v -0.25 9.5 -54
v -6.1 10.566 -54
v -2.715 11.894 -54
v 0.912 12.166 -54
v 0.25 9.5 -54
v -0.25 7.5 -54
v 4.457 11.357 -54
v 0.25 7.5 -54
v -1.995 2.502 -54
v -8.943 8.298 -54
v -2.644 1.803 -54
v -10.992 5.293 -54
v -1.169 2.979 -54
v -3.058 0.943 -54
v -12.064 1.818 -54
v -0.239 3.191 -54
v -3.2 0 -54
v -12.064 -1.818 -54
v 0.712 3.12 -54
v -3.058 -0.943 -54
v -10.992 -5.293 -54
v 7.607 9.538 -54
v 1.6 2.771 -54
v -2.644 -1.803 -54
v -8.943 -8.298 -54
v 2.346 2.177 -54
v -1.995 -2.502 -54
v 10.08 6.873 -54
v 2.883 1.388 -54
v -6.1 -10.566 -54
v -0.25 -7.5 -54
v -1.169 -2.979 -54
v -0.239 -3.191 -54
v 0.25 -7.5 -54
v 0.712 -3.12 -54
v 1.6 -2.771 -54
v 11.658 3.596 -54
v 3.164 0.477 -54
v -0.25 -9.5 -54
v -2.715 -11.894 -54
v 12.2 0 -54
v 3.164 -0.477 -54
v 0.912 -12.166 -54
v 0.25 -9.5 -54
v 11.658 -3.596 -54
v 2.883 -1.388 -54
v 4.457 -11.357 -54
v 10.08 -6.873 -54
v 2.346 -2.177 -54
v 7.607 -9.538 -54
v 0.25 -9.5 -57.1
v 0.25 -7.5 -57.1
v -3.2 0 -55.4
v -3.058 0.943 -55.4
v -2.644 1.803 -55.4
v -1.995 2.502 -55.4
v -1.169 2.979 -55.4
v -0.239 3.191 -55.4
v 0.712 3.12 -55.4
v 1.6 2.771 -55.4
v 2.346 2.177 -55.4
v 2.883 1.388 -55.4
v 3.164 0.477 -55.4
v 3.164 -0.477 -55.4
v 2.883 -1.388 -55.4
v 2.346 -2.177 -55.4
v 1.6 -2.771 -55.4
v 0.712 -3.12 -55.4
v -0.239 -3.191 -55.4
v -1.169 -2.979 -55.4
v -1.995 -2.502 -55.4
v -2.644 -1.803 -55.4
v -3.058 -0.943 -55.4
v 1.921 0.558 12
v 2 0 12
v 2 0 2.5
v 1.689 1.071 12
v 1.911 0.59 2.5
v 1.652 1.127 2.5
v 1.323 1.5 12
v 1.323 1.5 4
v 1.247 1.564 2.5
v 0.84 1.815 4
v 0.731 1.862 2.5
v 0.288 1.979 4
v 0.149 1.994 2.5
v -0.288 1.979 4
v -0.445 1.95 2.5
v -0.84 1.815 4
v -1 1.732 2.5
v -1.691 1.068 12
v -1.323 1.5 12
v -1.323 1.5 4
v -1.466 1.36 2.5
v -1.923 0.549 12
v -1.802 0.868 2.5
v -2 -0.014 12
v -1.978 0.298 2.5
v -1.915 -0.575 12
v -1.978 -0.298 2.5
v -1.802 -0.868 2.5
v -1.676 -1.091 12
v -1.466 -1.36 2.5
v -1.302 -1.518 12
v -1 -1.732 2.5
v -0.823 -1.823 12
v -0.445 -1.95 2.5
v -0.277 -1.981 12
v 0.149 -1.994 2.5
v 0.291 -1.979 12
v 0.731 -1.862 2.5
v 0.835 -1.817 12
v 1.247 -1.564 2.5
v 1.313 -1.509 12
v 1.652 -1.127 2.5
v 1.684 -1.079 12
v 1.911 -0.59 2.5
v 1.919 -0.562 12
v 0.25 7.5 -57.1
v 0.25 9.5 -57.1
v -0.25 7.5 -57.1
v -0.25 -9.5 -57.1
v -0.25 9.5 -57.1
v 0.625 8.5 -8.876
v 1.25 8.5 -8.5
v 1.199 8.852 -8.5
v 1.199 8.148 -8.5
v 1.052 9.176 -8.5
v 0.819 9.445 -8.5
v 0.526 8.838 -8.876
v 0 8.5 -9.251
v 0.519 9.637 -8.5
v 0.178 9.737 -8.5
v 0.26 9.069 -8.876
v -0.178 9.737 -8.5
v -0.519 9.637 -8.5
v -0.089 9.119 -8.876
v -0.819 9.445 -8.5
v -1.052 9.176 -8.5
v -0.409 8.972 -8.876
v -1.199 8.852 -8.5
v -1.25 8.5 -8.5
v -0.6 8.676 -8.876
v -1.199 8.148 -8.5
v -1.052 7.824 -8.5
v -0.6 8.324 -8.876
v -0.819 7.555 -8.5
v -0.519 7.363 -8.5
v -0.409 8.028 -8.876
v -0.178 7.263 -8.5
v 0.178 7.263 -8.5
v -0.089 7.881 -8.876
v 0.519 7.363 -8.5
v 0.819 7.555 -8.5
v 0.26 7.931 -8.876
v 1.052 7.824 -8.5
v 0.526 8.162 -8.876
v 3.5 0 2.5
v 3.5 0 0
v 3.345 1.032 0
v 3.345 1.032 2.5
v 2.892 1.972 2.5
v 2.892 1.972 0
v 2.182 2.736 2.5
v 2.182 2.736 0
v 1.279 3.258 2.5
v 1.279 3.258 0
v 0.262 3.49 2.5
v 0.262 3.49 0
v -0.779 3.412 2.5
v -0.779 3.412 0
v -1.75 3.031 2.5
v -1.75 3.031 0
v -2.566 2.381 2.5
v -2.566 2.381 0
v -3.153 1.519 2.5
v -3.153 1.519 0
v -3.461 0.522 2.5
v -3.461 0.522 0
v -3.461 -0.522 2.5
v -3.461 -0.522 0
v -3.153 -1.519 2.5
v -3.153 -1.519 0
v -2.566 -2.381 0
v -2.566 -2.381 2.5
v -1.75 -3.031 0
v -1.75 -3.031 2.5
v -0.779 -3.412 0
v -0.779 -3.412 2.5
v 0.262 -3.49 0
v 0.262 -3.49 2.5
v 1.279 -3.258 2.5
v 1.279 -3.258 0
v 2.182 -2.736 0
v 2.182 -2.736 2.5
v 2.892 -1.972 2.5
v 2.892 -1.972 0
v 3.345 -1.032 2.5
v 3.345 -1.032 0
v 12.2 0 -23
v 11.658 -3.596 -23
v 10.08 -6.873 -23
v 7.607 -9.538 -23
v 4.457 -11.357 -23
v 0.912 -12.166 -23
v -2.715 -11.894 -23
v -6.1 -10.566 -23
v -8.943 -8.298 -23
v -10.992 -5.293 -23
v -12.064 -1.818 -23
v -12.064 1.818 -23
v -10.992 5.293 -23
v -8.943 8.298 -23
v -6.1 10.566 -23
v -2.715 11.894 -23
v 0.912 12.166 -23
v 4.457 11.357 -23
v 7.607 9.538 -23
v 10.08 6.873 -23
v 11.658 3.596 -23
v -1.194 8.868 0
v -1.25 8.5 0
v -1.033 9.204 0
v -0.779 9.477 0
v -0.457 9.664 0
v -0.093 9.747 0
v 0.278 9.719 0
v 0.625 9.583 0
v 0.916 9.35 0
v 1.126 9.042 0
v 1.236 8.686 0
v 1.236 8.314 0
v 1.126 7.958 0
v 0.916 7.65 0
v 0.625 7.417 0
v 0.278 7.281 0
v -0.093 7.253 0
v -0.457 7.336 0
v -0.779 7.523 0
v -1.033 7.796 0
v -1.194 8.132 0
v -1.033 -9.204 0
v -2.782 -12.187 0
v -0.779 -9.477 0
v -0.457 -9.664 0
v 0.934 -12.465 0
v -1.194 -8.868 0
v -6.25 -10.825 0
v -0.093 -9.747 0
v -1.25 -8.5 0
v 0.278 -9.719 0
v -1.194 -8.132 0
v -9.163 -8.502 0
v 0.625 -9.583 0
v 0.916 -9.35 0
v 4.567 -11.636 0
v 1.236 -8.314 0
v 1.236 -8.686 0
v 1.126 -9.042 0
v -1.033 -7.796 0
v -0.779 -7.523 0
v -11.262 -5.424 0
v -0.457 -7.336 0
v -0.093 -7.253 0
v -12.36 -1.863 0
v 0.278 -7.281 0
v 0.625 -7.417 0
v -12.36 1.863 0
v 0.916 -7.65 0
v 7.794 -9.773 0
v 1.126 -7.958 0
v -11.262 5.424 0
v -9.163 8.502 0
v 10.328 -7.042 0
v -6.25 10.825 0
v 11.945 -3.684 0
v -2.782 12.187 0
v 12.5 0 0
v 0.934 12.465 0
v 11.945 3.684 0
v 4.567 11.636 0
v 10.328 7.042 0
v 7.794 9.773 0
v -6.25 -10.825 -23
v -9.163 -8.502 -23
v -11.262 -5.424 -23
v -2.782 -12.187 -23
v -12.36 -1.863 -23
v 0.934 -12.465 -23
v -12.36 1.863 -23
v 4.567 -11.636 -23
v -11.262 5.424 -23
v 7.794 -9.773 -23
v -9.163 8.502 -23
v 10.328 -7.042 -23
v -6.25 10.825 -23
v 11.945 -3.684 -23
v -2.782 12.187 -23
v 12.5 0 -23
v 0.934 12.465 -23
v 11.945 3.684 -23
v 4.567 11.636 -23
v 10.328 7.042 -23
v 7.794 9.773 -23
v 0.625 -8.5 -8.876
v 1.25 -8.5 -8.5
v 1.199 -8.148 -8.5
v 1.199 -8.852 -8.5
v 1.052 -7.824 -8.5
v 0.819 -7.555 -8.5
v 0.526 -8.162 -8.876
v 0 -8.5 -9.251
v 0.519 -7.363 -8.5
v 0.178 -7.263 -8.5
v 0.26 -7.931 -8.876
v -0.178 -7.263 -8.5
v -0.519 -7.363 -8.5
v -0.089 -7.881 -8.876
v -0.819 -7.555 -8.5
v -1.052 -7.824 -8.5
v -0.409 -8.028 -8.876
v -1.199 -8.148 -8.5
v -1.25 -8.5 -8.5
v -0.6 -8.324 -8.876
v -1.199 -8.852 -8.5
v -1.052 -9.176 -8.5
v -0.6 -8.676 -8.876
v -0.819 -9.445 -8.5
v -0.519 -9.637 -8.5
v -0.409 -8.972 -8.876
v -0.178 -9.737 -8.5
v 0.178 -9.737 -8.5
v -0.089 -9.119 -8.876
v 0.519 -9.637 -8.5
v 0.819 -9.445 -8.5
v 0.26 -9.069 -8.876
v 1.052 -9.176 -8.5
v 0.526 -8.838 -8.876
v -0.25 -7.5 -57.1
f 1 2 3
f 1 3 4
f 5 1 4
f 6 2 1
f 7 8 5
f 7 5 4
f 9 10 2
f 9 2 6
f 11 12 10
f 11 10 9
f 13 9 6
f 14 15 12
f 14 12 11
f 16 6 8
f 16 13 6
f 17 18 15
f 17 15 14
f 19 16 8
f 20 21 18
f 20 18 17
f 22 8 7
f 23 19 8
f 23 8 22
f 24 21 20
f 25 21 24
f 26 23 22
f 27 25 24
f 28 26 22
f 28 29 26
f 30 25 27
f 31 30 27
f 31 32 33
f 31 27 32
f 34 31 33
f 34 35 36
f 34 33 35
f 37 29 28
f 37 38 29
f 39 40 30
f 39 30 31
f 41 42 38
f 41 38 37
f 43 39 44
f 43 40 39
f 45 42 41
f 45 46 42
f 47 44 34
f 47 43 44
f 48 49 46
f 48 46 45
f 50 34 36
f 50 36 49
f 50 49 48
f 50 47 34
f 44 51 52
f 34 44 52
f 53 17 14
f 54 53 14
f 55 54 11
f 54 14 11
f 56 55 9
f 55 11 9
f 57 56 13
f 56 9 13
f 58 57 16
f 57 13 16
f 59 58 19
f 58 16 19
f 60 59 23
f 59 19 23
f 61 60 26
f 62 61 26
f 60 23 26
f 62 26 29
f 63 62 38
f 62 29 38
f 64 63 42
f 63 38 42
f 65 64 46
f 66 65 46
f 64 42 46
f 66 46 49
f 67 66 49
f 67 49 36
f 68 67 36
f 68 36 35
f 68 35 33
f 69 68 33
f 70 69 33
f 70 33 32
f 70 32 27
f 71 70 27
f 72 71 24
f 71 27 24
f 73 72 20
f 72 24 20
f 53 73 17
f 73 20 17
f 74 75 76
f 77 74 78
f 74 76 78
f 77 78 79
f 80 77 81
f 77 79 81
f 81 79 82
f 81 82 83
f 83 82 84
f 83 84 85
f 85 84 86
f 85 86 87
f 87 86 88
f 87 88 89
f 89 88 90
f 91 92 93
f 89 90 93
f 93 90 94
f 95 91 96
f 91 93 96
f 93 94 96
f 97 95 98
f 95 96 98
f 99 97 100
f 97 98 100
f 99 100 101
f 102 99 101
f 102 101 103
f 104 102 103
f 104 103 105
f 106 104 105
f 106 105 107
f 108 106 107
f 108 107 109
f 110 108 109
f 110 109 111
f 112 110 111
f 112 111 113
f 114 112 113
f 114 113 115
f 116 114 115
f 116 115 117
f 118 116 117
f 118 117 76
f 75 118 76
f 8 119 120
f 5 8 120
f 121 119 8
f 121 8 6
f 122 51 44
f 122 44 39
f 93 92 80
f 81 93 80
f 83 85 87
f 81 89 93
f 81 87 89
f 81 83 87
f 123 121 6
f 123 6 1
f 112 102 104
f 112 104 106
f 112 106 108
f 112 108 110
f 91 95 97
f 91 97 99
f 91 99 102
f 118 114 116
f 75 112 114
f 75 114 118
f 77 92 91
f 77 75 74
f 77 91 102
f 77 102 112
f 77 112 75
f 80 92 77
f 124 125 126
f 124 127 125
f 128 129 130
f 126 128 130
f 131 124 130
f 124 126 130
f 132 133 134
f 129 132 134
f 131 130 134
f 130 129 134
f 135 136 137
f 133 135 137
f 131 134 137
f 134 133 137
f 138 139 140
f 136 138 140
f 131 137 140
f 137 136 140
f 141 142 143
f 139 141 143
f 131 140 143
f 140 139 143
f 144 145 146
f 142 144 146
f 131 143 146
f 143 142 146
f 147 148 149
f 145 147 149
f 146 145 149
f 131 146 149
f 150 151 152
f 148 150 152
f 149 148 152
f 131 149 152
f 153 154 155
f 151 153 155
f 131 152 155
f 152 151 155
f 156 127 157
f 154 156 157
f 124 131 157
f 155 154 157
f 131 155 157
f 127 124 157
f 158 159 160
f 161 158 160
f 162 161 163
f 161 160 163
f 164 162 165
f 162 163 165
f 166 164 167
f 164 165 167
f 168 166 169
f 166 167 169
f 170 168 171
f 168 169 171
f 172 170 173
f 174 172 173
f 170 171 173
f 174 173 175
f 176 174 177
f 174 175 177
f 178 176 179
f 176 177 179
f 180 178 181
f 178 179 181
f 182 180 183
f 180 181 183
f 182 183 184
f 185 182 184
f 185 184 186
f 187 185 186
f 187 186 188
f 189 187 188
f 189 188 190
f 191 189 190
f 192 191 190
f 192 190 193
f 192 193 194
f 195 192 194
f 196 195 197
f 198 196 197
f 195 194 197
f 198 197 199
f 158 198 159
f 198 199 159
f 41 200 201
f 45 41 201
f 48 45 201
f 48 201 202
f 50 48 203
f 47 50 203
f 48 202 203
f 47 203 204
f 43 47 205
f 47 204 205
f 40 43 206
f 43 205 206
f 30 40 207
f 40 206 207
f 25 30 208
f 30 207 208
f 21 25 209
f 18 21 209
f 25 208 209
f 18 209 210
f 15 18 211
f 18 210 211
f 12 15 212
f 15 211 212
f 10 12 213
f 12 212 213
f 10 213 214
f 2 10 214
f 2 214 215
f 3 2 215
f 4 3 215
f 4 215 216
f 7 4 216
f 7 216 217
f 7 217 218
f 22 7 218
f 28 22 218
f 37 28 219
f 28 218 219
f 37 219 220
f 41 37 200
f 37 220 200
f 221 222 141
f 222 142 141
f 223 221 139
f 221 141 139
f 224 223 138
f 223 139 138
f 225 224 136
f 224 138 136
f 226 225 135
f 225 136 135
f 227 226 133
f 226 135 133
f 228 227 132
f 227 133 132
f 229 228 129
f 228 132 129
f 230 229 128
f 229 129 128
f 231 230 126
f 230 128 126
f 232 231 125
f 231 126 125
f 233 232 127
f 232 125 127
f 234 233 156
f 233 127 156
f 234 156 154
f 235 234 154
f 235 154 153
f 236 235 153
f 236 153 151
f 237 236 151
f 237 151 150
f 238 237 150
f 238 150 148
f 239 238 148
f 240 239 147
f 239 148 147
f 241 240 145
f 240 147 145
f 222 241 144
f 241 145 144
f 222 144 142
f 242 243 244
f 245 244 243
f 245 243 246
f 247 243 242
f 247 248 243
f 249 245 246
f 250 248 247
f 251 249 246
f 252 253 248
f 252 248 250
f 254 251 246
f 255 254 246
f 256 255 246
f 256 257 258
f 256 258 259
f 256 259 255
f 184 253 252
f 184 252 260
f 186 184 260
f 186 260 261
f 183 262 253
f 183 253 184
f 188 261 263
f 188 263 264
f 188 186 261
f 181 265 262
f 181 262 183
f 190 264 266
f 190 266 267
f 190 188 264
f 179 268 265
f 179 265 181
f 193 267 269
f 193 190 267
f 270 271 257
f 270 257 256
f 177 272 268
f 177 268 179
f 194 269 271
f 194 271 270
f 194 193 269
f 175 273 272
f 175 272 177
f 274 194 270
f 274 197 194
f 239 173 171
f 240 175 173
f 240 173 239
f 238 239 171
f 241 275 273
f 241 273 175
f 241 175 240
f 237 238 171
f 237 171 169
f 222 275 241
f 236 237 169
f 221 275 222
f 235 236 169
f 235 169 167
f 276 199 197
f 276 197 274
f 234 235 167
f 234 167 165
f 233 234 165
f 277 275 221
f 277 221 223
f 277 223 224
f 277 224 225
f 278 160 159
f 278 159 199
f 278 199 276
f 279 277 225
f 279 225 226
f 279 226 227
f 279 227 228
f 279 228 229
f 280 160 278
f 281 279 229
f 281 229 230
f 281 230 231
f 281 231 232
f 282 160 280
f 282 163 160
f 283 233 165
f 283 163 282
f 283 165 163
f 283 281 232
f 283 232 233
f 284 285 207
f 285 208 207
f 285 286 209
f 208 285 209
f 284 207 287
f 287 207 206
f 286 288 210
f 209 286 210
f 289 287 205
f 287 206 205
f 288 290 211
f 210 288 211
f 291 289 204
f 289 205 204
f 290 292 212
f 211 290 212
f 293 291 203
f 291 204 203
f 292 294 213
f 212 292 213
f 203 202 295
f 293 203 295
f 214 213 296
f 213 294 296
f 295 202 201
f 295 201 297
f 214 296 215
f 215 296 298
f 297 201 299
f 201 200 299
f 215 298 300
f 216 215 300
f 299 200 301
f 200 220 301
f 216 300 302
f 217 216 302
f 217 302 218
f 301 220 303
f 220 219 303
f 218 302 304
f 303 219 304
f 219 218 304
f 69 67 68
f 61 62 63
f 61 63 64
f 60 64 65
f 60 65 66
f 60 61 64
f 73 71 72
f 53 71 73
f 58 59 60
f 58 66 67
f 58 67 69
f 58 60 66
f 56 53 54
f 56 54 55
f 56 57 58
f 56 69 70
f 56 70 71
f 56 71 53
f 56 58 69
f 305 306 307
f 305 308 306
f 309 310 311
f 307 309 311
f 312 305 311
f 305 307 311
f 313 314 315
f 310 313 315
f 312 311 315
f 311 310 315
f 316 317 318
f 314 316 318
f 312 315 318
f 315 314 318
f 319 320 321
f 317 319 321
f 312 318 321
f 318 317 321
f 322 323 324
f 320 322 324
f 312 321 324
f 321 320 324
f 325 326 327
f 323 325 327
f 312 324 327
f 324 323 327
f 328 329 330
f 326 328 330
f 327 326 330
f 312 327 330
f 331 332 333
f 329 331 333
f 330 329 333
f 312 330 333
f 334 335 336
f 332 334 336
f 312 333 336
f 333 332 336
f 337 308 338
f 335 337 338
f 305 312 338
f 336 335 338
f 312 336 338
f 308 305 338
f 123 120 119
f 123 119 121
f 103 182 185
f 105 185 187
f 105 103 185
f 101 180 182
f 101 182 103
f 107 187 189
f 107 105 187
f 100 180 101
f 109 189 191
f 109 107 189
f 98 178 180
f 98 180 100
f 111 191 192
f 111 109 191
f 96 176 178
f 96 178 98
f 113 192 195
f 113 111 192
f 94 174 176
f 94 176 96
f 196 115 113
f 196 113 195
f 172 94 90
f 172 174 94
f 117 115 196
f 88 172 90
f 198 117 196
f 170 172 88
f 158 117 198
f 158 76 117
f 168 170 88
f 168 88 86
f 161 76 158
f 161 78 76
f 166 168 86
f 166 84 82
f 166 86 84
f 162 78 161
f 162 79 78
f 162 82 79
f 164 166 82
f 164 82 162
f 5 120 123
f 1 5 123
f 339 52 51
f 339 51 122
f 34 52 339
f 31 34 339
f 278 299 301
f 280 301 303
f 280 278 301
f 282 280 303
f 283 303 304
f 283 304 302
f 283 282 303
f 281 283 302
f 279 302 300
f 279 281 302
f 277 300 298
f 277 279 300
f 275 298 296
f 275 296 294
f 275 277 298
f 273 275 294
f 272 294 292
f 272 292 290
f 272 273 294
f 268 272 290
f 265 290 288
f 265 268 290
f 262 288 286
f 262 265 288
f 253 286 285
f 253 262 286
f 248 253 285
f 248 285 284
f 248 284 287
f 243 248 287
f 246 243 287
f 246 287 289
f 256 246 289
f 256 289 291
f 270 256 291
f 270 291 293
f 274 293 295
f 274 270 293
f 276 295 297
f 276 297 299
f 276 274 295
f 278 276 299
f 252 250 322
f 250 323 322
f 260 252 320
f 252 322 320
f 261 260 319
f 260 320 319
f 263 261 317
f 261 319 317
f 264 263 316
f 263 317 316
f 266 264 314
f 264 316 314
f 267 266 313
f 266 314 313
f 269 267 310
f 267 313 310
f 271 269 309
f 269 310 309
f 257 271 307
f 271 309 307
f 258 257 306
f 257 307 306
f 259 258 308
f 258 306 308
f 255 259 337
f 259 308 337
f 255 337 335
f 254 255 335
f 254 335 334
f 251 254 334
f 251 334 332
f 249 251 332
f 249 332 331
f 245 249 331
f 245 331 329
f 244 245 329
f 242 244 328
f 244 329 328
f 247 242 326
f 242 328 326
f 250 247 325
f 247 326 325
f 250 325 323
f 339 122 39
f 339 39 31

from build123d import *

# Parameters (mm, degrees)
SKETCH1_R             = 12.5
BOSS_EXTRUDE1_DEPTH   = 23
SKETCH2_R             = 3.5
BOSS_EXTRUDE2_DEPTH   = 2.5
SKETCH3_R             = 2
BOSS_EXTRUDE4_DEPTH   = 9.5
SKETCH4_W             = 2.645751312
SKETCH4_H             = 0.5
CUT_EXTRUDE1_DEPTH    = 8
SKETCH5_R             = 12.2
BOSS_EXTRUDE5_DEPTH   = 31
SKETCH6_R             = 3.2
BOSS_EXTRUDE6_DEPTH   = 1.4
SKETCH7_W             = 0.5
SKETCH7_H             = 2
BOSS_EXTRUDE7_DEPTH   = 3.1
M3_TAPPED_HOLE1_D     = 2.5
M3_TAPPED_HOLE1_DEPTH = 8.5
M3_TAPPED_HOLE1_TIP   = 0.751075774


with BuildPart() as part:
    # Sketch1 → Boss-Extrude1 (new body)
    with BuildSketch(Plane.XY):
        Circle(SKETCH1_R)
    extrude(amount=-BOSS_EXTRUDE1_DEPTH)

    # Sketch2 → Boss-Extrude2 (add)
    with BuildSketch(Plane.XY):
        Circle(SKETCH2_R)
    extrude(amount=BOSS_EXTRUDE2_DEPTH)

    # Sketch3 → Boss-Extrude4 (add)
    with BuildSketch(Plane.XY.offset(2.5)):
        Circle(SKETCH3_R)
    extrude(amount=BOSS_EXTRUDE4_DEPTH)

    # Sketch4 → Cut-Extrude1 (cut)
    with BuildSketch(Plane.XY.offset(12)):
        with Locations((0, 1.75)):
            Rectangle(SKETCH4_W, SKETCH4_H)
    extrude(amount=-CUT_EXTRUDE1_DEPTH, mode=Mode.SUBTRACT)

    # Sketch5 → Boss-Extrude5 (add)
    with BuildSketch(Plane(origin=(0, 0, -23), x_dir=(-1, 0, 0), z_dir=(0, 0, -1))):
        with Locations(Location((0, 0, 0), (0, 0, 180))):
            Circle(SKETCH5_R)
    extrude(amount=BOSS_EXTRUDE5_DEPTH)

    # Sketch6 → Boss-Extrude6 (add)
    with BuildSketch(Plane(origin=(0, 0, -54), x_dir=(-1, 0, 0), z_dir=(0, 0, -1))):
        Circle(SKETCH6_R)
    extrude(amount=BOSS_EXTRUDE6_DEPTH)

    # Sketch7 → Boss-Extrude7 (add)
    with BuildSketch(Plane(origin=(0, 0, -54), x_dir=(-1, 0, 0), z_dir=(0, 0, -1))):
        with Locations((0, 8.5)):
            Rectangle(SKETCH7_W, SKETCH7_H)
        with Locations((0, -8.5)):
            Rectangle(SKETCH7_W, SKETCH7_H)
    extrude(amount=BOSS_EXTRUDE7_DEPTH)

    # M3 Tapped Hole1
    with Locations(Plane.XY):
        with Locations((0, 8.5), (0, -8.5)):
            Hole(M3_TAPPED_HOLE1_D / 2, depth=M3_TAPPED_HOLE1_DEPTH)
            with Locations((0, 0, -(M3_TAPPED_HOLE1_DEPTH + M3_TAPPED_HOLE1_TIP / 2))):  # 118° drill point
                Cone(0, M3_TAPPED_HOLE1_D / 2, M3_TAPPED_HOLE1_TIP, mode=Mode.SUBTRACT)


solid = part.part
